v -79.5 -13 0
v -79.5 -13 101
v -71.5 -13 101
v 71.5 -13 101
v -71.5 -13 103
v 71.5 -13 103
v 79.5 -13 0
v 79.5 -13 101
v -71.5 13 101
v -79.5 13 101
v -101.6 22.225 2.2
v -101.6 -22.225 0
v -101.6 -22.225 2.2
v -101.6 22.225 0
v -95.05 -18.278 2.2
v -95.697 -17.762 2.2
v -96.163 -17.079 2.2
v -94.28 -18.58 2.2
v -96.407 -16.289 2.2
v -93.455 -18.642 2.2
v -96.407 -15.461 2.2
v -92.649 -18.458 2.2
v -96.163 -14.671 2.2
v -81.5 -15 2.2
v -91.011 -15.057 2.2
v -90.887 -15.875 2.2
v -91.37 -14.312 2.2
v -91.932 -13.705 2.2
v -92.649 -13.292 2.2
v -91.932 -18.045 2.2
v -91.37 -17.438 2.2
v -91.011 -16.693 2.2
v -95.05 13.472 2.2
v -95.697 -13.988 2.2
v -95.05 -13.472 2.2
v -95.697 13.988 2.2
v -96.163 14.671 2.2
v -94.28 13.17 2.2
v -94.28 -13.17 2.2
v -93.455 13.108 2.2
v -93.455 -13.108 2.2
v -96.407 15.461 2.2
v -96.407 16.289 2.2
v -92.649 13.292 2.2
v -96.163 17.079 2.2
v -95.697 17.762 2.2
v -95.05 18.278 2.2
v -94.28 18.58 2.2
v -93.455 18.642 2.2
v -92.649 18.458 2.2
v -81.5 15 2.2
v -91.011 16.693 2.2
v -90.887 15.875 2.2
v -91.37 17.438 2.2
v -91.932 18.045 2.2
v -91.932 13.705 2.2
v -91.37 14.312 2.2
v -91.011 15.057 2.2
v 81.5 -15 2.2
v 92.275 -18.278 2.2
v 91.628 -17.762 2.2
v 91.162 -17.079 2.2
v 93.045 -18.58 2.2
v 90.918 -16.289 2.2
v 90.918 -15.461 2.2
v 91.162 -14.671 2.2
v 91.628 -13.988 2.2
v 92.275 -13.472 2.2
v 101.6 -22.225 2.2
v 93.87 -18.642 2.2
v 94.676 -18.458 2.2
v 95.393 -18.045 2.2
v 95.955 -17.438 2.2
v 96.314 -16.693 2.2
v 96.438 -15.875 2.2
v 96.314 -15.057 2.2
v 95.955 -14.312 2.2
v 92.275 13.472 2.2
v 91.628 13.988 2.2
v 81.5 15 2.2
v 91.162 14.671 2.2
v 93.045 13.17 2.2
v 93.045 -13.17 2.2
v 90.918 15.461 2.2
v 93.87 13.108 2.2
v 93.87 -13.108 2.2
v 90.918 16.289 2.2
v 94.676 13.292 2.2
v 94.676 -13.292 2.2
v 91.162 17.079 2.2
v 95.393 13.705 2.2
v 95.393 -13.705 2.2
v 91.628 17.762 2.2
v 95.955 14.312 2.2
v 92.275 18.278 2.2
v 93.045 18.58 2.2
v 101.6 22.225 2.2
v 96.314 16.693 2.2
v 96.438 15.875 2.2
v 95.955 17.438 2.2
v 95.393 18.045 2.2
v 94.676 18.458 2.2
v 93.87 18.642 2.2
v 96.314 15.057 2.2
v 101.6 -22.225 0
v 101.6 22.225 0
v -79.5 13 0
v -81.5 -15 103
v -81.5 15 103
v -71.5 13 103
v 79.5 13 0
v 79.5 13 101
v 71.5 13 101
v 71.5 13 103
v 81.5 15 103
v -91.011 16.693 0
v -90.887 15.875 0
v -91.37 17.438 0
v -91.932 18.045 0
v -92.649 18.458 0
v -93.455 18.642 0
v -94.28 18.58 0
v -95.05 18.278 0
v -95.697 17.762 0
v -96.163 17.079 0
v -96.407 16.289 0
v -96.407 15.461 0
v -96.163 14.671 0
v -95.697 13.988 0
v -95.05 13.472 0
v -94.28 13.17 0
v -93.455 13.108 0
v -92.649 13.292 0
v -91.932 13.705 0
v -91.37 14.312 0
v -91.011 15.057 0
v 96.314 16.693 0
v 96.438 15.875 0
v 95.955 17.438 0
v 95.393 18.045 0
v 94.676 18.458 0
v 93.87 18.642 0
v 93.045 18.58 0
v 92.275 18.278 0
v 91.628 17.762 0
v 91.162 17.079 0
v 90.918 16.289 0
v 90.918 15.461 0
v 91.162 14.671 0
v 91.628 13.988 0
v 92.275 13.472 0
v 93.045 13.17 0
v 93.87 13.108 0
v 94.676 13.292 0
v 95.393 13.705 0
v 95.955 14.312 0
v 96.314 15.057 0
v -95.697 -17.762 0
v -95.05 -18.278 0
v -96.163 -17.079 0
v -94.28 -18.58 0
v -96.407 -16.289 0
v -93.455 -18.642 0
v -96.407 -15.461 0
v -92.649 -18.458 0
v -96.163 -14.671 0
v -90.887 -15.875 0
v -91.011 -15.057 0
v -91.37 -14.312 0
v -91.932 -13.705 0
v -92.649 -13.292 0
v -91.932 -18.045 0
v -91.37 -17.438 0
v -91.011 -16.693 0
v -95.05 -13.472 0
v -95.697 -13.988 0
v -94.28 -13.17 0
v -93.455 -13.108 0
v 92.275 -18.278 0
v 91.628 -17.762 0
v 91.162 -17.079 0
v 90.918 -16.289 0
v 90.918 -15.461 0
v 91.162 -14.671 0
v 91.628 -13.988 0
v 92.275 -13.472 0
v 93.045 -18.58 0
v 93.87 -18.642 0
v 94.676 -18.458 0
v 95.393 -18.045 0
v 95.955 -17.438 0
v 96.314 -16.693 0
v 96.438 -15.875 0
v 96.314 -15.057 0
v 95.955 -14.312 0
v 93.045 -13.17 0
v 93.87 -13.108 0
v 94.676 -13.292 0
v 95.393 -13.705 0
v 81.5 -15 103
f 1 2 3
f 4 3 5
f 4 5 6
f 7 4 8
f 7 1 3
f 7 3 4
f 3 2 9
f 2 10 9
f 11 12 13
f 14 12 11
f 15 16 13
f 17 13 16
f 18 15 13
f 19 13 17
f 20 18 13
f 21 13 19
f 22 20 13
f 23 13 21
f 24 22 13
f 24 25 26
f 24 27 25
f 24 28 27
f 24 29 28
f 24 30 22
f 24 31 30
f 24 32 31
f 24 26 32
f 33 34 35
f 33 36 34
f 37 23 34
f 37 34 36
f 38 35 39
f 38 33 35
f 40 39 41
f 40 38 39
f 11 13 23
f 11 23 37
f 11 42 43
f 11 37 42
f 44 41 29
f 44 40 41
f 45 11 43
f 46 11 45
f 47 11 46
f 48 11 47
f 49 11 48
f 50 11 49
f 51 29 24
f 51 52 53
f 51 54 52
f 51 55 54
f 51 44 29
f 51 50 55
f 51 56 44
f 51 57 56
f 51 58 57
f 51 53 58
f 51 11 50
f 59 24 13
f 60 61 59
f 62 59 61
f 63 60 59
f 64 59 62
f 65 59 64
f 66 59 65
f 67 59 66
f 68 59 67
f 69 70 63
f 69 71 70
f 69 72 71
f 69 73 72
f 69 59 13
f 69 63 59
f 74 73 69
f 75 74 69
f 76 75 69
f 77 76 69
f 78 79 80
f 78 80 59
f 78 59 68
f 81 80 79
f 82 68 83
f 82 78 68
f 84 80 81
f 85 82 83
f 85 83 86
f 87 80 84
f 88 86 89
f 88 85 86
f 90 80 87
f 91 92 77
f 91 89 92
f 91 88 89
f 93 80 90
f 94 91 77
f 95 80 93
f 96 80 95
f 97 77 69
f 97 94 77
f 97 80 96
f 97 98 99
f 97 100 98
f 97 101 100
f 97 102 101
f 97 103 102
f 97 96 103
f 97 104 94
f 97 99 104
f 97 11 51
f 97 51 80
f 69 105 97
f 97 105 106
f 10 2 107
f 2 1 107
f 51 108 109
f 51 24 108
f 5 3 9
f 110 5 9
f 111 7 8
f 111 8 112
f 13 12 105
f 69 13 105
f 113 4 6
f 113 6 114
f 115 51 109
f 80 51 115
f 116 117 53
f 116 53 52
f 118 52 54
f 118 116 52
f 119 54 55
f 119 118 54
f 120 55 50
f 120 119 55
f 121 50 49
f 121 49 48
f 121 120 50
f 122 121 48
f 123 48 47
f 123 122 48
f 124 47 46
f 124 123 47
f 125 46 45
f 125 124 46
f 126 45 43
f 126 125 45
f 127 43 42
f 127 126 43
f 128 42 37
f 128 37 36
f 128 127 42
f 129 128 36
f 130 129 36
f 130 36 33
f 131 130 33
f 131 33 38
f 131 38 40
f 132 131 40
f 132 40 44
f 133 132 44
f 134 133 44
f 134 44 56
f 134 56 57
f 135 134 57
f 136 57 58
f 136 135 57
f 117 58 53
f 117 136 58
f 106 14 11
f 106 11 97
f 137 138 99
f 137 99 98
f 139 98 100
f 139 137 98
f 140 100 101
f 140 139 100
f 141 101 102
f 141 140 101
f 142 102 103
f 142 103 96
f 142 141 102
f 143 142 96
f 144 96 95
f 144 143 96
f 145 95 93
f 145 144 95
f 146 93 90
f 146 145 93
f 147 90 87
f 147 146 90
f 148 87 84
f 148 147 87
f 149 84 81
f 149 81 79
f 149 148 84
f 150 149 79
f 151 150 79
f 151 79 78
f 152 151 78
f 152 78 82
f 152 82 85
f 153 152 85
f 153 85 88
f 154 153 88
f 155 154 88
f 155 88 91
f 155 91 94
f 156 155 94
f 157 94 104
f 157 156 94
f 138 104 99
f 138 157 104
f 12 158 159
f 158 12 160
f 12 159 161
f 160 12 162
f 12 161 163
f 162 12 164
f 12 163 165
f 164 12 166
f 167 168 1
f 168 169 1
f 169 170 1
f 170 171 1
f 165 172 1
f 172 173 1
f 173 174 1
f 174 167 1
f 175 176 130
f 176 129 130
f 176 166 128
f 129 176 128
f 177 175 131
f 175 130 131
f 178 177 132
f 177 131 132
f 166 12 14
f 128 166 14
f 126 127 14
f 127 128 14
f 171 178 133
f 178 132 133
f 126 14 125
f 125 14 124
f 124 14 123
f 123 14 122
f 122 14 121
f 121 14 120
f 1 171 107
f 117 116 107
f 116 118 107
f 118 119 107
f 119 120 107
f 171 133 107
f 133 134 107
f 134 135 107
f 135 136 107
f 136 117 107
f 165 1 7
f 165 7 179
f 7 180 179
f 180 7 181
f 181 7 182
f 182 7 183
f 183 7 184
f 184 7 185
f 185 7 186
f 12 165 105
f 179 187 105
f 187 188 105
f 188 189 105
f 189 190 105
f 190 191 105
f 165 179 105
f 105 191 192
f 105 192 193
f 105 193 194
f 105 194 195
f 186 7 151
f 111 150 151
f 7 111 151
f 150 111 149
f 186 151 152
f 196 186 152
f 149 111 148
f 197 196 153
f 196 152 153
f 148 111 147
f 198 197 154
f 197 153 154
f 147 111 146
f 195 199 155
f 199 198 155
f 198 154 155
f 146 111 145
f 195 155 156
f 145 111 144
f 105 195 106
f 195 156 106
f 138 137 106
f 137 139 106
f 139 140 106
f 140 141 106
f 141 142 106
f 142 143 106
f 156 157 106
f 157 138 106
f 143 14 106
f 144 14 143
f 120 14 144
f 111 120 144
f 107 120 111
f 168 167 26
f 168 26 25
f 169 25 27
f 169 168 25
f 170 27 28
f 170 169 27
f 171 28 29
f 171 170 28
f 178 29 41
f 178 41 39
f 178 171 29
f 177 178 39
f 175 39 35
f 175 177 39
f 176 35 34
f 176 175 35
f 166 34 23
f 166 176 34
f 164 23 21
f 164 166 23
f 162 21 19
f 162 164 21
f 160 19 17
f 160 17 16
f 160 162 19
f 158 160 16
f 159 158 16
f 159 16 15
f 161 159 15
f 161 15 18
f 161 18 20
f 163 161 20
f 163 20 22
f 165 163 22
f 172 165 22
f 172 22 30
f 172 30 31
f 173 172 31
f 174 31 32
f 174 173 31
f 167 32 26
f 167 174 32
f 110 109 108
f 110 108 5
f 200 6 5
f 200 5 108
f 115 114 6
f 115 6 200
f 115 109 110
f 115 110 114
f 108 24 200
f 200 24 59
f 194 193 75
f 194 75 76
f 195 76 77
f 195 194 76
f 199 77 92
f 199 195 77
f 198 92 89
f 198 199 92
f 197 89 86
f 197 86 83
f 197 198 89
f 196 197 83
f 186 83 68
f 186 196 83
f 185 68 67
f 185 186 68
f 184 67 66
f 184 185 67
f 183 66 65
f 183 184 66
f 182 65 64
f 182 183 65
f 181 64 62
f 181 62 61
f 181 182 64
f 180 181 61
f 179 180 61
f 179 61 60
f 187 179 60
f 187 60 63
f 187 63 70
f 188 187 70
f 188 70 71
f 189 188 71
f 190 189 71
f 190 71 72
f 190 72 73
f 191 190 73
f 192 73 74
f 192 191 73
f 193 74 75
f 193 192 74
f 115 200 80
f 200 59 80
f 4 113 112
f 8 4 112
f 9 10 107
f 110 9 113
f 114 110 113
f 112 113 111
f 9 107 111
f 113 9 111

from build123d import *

# Parameters (mm, degrees)
SKETCH_W      = 203.2
SKETCH_H      = 44.45
SKETCH_R      = 2.775
SKETCH_W_2    = 159
SKETCH_H_2    = 26
PAD_DEPTH     = 2.2
SKETCH001_W   = 163
SKETCH001_H   = 30
SKETCH001_W_2 = 159
SKETCH001_H_2 = 26
PAD001_DEPTH  = 98.8
SKETCH002_W   = 163
SKETCH002_H   = 30
SKETCH002_W_2 = 143
SKETCH002_H_2 = 26
PAD002_DEPTH  = 2


with BuildPart() as part:
    # Sketch → Pad (new body)
    with BuildSketch(Plane.XY):
        Rectangle(SKETCH_W, SKETCH_H)
        with Locations((-93.6625, 15.875)):
            Circle(SKETCH_R, mode=Mode.SUBTRACT)
        with Locations((-93.6625, -15.875)):
            Circle(SKETCH_R, mode=Mode.SUBTRACT)
        with Locations((93.6625, 15.875)):
            Circle(SKETCH_R, mode=Mode.SUBTRACT)
        with Locations((93.6625, -15.875)):
            Circle(SKETCH_R, mode=Mode.SUBTRACT)
        Rectangle(SKETCH_W_2, SKETCH_H_2, mode=Mode.SUBTRACT)
    extrude(amount=PAD_DEPTH)

    # Sketch001 (on Face14 of Pad) → Pad001 (join)
    with BuildSketch(Plane.XY.offset(2.2)):
        Rectangle(SKETCH001_W, SKETCH001_H)
        Rectangle(SKETCH001_W_2, SKETCH001_H_2, mode=Mode.SUBTRACT)
    extrude(amount=PAD001_DEPTH)

    # Sketch002 (on Face15 of Pad001) → Pad002 (join)
    with BuildSketch(Plane.XY.offset(101)):
        Rectangle(SKETCH002_W, SKETCH002_H)
        Rectangle(SKETCH002_W_2, SKETCH002_H_2, mode=Mode.SUBTRACT)
    extrude(amount=PAD002_DEPTH)


solid = part.part
